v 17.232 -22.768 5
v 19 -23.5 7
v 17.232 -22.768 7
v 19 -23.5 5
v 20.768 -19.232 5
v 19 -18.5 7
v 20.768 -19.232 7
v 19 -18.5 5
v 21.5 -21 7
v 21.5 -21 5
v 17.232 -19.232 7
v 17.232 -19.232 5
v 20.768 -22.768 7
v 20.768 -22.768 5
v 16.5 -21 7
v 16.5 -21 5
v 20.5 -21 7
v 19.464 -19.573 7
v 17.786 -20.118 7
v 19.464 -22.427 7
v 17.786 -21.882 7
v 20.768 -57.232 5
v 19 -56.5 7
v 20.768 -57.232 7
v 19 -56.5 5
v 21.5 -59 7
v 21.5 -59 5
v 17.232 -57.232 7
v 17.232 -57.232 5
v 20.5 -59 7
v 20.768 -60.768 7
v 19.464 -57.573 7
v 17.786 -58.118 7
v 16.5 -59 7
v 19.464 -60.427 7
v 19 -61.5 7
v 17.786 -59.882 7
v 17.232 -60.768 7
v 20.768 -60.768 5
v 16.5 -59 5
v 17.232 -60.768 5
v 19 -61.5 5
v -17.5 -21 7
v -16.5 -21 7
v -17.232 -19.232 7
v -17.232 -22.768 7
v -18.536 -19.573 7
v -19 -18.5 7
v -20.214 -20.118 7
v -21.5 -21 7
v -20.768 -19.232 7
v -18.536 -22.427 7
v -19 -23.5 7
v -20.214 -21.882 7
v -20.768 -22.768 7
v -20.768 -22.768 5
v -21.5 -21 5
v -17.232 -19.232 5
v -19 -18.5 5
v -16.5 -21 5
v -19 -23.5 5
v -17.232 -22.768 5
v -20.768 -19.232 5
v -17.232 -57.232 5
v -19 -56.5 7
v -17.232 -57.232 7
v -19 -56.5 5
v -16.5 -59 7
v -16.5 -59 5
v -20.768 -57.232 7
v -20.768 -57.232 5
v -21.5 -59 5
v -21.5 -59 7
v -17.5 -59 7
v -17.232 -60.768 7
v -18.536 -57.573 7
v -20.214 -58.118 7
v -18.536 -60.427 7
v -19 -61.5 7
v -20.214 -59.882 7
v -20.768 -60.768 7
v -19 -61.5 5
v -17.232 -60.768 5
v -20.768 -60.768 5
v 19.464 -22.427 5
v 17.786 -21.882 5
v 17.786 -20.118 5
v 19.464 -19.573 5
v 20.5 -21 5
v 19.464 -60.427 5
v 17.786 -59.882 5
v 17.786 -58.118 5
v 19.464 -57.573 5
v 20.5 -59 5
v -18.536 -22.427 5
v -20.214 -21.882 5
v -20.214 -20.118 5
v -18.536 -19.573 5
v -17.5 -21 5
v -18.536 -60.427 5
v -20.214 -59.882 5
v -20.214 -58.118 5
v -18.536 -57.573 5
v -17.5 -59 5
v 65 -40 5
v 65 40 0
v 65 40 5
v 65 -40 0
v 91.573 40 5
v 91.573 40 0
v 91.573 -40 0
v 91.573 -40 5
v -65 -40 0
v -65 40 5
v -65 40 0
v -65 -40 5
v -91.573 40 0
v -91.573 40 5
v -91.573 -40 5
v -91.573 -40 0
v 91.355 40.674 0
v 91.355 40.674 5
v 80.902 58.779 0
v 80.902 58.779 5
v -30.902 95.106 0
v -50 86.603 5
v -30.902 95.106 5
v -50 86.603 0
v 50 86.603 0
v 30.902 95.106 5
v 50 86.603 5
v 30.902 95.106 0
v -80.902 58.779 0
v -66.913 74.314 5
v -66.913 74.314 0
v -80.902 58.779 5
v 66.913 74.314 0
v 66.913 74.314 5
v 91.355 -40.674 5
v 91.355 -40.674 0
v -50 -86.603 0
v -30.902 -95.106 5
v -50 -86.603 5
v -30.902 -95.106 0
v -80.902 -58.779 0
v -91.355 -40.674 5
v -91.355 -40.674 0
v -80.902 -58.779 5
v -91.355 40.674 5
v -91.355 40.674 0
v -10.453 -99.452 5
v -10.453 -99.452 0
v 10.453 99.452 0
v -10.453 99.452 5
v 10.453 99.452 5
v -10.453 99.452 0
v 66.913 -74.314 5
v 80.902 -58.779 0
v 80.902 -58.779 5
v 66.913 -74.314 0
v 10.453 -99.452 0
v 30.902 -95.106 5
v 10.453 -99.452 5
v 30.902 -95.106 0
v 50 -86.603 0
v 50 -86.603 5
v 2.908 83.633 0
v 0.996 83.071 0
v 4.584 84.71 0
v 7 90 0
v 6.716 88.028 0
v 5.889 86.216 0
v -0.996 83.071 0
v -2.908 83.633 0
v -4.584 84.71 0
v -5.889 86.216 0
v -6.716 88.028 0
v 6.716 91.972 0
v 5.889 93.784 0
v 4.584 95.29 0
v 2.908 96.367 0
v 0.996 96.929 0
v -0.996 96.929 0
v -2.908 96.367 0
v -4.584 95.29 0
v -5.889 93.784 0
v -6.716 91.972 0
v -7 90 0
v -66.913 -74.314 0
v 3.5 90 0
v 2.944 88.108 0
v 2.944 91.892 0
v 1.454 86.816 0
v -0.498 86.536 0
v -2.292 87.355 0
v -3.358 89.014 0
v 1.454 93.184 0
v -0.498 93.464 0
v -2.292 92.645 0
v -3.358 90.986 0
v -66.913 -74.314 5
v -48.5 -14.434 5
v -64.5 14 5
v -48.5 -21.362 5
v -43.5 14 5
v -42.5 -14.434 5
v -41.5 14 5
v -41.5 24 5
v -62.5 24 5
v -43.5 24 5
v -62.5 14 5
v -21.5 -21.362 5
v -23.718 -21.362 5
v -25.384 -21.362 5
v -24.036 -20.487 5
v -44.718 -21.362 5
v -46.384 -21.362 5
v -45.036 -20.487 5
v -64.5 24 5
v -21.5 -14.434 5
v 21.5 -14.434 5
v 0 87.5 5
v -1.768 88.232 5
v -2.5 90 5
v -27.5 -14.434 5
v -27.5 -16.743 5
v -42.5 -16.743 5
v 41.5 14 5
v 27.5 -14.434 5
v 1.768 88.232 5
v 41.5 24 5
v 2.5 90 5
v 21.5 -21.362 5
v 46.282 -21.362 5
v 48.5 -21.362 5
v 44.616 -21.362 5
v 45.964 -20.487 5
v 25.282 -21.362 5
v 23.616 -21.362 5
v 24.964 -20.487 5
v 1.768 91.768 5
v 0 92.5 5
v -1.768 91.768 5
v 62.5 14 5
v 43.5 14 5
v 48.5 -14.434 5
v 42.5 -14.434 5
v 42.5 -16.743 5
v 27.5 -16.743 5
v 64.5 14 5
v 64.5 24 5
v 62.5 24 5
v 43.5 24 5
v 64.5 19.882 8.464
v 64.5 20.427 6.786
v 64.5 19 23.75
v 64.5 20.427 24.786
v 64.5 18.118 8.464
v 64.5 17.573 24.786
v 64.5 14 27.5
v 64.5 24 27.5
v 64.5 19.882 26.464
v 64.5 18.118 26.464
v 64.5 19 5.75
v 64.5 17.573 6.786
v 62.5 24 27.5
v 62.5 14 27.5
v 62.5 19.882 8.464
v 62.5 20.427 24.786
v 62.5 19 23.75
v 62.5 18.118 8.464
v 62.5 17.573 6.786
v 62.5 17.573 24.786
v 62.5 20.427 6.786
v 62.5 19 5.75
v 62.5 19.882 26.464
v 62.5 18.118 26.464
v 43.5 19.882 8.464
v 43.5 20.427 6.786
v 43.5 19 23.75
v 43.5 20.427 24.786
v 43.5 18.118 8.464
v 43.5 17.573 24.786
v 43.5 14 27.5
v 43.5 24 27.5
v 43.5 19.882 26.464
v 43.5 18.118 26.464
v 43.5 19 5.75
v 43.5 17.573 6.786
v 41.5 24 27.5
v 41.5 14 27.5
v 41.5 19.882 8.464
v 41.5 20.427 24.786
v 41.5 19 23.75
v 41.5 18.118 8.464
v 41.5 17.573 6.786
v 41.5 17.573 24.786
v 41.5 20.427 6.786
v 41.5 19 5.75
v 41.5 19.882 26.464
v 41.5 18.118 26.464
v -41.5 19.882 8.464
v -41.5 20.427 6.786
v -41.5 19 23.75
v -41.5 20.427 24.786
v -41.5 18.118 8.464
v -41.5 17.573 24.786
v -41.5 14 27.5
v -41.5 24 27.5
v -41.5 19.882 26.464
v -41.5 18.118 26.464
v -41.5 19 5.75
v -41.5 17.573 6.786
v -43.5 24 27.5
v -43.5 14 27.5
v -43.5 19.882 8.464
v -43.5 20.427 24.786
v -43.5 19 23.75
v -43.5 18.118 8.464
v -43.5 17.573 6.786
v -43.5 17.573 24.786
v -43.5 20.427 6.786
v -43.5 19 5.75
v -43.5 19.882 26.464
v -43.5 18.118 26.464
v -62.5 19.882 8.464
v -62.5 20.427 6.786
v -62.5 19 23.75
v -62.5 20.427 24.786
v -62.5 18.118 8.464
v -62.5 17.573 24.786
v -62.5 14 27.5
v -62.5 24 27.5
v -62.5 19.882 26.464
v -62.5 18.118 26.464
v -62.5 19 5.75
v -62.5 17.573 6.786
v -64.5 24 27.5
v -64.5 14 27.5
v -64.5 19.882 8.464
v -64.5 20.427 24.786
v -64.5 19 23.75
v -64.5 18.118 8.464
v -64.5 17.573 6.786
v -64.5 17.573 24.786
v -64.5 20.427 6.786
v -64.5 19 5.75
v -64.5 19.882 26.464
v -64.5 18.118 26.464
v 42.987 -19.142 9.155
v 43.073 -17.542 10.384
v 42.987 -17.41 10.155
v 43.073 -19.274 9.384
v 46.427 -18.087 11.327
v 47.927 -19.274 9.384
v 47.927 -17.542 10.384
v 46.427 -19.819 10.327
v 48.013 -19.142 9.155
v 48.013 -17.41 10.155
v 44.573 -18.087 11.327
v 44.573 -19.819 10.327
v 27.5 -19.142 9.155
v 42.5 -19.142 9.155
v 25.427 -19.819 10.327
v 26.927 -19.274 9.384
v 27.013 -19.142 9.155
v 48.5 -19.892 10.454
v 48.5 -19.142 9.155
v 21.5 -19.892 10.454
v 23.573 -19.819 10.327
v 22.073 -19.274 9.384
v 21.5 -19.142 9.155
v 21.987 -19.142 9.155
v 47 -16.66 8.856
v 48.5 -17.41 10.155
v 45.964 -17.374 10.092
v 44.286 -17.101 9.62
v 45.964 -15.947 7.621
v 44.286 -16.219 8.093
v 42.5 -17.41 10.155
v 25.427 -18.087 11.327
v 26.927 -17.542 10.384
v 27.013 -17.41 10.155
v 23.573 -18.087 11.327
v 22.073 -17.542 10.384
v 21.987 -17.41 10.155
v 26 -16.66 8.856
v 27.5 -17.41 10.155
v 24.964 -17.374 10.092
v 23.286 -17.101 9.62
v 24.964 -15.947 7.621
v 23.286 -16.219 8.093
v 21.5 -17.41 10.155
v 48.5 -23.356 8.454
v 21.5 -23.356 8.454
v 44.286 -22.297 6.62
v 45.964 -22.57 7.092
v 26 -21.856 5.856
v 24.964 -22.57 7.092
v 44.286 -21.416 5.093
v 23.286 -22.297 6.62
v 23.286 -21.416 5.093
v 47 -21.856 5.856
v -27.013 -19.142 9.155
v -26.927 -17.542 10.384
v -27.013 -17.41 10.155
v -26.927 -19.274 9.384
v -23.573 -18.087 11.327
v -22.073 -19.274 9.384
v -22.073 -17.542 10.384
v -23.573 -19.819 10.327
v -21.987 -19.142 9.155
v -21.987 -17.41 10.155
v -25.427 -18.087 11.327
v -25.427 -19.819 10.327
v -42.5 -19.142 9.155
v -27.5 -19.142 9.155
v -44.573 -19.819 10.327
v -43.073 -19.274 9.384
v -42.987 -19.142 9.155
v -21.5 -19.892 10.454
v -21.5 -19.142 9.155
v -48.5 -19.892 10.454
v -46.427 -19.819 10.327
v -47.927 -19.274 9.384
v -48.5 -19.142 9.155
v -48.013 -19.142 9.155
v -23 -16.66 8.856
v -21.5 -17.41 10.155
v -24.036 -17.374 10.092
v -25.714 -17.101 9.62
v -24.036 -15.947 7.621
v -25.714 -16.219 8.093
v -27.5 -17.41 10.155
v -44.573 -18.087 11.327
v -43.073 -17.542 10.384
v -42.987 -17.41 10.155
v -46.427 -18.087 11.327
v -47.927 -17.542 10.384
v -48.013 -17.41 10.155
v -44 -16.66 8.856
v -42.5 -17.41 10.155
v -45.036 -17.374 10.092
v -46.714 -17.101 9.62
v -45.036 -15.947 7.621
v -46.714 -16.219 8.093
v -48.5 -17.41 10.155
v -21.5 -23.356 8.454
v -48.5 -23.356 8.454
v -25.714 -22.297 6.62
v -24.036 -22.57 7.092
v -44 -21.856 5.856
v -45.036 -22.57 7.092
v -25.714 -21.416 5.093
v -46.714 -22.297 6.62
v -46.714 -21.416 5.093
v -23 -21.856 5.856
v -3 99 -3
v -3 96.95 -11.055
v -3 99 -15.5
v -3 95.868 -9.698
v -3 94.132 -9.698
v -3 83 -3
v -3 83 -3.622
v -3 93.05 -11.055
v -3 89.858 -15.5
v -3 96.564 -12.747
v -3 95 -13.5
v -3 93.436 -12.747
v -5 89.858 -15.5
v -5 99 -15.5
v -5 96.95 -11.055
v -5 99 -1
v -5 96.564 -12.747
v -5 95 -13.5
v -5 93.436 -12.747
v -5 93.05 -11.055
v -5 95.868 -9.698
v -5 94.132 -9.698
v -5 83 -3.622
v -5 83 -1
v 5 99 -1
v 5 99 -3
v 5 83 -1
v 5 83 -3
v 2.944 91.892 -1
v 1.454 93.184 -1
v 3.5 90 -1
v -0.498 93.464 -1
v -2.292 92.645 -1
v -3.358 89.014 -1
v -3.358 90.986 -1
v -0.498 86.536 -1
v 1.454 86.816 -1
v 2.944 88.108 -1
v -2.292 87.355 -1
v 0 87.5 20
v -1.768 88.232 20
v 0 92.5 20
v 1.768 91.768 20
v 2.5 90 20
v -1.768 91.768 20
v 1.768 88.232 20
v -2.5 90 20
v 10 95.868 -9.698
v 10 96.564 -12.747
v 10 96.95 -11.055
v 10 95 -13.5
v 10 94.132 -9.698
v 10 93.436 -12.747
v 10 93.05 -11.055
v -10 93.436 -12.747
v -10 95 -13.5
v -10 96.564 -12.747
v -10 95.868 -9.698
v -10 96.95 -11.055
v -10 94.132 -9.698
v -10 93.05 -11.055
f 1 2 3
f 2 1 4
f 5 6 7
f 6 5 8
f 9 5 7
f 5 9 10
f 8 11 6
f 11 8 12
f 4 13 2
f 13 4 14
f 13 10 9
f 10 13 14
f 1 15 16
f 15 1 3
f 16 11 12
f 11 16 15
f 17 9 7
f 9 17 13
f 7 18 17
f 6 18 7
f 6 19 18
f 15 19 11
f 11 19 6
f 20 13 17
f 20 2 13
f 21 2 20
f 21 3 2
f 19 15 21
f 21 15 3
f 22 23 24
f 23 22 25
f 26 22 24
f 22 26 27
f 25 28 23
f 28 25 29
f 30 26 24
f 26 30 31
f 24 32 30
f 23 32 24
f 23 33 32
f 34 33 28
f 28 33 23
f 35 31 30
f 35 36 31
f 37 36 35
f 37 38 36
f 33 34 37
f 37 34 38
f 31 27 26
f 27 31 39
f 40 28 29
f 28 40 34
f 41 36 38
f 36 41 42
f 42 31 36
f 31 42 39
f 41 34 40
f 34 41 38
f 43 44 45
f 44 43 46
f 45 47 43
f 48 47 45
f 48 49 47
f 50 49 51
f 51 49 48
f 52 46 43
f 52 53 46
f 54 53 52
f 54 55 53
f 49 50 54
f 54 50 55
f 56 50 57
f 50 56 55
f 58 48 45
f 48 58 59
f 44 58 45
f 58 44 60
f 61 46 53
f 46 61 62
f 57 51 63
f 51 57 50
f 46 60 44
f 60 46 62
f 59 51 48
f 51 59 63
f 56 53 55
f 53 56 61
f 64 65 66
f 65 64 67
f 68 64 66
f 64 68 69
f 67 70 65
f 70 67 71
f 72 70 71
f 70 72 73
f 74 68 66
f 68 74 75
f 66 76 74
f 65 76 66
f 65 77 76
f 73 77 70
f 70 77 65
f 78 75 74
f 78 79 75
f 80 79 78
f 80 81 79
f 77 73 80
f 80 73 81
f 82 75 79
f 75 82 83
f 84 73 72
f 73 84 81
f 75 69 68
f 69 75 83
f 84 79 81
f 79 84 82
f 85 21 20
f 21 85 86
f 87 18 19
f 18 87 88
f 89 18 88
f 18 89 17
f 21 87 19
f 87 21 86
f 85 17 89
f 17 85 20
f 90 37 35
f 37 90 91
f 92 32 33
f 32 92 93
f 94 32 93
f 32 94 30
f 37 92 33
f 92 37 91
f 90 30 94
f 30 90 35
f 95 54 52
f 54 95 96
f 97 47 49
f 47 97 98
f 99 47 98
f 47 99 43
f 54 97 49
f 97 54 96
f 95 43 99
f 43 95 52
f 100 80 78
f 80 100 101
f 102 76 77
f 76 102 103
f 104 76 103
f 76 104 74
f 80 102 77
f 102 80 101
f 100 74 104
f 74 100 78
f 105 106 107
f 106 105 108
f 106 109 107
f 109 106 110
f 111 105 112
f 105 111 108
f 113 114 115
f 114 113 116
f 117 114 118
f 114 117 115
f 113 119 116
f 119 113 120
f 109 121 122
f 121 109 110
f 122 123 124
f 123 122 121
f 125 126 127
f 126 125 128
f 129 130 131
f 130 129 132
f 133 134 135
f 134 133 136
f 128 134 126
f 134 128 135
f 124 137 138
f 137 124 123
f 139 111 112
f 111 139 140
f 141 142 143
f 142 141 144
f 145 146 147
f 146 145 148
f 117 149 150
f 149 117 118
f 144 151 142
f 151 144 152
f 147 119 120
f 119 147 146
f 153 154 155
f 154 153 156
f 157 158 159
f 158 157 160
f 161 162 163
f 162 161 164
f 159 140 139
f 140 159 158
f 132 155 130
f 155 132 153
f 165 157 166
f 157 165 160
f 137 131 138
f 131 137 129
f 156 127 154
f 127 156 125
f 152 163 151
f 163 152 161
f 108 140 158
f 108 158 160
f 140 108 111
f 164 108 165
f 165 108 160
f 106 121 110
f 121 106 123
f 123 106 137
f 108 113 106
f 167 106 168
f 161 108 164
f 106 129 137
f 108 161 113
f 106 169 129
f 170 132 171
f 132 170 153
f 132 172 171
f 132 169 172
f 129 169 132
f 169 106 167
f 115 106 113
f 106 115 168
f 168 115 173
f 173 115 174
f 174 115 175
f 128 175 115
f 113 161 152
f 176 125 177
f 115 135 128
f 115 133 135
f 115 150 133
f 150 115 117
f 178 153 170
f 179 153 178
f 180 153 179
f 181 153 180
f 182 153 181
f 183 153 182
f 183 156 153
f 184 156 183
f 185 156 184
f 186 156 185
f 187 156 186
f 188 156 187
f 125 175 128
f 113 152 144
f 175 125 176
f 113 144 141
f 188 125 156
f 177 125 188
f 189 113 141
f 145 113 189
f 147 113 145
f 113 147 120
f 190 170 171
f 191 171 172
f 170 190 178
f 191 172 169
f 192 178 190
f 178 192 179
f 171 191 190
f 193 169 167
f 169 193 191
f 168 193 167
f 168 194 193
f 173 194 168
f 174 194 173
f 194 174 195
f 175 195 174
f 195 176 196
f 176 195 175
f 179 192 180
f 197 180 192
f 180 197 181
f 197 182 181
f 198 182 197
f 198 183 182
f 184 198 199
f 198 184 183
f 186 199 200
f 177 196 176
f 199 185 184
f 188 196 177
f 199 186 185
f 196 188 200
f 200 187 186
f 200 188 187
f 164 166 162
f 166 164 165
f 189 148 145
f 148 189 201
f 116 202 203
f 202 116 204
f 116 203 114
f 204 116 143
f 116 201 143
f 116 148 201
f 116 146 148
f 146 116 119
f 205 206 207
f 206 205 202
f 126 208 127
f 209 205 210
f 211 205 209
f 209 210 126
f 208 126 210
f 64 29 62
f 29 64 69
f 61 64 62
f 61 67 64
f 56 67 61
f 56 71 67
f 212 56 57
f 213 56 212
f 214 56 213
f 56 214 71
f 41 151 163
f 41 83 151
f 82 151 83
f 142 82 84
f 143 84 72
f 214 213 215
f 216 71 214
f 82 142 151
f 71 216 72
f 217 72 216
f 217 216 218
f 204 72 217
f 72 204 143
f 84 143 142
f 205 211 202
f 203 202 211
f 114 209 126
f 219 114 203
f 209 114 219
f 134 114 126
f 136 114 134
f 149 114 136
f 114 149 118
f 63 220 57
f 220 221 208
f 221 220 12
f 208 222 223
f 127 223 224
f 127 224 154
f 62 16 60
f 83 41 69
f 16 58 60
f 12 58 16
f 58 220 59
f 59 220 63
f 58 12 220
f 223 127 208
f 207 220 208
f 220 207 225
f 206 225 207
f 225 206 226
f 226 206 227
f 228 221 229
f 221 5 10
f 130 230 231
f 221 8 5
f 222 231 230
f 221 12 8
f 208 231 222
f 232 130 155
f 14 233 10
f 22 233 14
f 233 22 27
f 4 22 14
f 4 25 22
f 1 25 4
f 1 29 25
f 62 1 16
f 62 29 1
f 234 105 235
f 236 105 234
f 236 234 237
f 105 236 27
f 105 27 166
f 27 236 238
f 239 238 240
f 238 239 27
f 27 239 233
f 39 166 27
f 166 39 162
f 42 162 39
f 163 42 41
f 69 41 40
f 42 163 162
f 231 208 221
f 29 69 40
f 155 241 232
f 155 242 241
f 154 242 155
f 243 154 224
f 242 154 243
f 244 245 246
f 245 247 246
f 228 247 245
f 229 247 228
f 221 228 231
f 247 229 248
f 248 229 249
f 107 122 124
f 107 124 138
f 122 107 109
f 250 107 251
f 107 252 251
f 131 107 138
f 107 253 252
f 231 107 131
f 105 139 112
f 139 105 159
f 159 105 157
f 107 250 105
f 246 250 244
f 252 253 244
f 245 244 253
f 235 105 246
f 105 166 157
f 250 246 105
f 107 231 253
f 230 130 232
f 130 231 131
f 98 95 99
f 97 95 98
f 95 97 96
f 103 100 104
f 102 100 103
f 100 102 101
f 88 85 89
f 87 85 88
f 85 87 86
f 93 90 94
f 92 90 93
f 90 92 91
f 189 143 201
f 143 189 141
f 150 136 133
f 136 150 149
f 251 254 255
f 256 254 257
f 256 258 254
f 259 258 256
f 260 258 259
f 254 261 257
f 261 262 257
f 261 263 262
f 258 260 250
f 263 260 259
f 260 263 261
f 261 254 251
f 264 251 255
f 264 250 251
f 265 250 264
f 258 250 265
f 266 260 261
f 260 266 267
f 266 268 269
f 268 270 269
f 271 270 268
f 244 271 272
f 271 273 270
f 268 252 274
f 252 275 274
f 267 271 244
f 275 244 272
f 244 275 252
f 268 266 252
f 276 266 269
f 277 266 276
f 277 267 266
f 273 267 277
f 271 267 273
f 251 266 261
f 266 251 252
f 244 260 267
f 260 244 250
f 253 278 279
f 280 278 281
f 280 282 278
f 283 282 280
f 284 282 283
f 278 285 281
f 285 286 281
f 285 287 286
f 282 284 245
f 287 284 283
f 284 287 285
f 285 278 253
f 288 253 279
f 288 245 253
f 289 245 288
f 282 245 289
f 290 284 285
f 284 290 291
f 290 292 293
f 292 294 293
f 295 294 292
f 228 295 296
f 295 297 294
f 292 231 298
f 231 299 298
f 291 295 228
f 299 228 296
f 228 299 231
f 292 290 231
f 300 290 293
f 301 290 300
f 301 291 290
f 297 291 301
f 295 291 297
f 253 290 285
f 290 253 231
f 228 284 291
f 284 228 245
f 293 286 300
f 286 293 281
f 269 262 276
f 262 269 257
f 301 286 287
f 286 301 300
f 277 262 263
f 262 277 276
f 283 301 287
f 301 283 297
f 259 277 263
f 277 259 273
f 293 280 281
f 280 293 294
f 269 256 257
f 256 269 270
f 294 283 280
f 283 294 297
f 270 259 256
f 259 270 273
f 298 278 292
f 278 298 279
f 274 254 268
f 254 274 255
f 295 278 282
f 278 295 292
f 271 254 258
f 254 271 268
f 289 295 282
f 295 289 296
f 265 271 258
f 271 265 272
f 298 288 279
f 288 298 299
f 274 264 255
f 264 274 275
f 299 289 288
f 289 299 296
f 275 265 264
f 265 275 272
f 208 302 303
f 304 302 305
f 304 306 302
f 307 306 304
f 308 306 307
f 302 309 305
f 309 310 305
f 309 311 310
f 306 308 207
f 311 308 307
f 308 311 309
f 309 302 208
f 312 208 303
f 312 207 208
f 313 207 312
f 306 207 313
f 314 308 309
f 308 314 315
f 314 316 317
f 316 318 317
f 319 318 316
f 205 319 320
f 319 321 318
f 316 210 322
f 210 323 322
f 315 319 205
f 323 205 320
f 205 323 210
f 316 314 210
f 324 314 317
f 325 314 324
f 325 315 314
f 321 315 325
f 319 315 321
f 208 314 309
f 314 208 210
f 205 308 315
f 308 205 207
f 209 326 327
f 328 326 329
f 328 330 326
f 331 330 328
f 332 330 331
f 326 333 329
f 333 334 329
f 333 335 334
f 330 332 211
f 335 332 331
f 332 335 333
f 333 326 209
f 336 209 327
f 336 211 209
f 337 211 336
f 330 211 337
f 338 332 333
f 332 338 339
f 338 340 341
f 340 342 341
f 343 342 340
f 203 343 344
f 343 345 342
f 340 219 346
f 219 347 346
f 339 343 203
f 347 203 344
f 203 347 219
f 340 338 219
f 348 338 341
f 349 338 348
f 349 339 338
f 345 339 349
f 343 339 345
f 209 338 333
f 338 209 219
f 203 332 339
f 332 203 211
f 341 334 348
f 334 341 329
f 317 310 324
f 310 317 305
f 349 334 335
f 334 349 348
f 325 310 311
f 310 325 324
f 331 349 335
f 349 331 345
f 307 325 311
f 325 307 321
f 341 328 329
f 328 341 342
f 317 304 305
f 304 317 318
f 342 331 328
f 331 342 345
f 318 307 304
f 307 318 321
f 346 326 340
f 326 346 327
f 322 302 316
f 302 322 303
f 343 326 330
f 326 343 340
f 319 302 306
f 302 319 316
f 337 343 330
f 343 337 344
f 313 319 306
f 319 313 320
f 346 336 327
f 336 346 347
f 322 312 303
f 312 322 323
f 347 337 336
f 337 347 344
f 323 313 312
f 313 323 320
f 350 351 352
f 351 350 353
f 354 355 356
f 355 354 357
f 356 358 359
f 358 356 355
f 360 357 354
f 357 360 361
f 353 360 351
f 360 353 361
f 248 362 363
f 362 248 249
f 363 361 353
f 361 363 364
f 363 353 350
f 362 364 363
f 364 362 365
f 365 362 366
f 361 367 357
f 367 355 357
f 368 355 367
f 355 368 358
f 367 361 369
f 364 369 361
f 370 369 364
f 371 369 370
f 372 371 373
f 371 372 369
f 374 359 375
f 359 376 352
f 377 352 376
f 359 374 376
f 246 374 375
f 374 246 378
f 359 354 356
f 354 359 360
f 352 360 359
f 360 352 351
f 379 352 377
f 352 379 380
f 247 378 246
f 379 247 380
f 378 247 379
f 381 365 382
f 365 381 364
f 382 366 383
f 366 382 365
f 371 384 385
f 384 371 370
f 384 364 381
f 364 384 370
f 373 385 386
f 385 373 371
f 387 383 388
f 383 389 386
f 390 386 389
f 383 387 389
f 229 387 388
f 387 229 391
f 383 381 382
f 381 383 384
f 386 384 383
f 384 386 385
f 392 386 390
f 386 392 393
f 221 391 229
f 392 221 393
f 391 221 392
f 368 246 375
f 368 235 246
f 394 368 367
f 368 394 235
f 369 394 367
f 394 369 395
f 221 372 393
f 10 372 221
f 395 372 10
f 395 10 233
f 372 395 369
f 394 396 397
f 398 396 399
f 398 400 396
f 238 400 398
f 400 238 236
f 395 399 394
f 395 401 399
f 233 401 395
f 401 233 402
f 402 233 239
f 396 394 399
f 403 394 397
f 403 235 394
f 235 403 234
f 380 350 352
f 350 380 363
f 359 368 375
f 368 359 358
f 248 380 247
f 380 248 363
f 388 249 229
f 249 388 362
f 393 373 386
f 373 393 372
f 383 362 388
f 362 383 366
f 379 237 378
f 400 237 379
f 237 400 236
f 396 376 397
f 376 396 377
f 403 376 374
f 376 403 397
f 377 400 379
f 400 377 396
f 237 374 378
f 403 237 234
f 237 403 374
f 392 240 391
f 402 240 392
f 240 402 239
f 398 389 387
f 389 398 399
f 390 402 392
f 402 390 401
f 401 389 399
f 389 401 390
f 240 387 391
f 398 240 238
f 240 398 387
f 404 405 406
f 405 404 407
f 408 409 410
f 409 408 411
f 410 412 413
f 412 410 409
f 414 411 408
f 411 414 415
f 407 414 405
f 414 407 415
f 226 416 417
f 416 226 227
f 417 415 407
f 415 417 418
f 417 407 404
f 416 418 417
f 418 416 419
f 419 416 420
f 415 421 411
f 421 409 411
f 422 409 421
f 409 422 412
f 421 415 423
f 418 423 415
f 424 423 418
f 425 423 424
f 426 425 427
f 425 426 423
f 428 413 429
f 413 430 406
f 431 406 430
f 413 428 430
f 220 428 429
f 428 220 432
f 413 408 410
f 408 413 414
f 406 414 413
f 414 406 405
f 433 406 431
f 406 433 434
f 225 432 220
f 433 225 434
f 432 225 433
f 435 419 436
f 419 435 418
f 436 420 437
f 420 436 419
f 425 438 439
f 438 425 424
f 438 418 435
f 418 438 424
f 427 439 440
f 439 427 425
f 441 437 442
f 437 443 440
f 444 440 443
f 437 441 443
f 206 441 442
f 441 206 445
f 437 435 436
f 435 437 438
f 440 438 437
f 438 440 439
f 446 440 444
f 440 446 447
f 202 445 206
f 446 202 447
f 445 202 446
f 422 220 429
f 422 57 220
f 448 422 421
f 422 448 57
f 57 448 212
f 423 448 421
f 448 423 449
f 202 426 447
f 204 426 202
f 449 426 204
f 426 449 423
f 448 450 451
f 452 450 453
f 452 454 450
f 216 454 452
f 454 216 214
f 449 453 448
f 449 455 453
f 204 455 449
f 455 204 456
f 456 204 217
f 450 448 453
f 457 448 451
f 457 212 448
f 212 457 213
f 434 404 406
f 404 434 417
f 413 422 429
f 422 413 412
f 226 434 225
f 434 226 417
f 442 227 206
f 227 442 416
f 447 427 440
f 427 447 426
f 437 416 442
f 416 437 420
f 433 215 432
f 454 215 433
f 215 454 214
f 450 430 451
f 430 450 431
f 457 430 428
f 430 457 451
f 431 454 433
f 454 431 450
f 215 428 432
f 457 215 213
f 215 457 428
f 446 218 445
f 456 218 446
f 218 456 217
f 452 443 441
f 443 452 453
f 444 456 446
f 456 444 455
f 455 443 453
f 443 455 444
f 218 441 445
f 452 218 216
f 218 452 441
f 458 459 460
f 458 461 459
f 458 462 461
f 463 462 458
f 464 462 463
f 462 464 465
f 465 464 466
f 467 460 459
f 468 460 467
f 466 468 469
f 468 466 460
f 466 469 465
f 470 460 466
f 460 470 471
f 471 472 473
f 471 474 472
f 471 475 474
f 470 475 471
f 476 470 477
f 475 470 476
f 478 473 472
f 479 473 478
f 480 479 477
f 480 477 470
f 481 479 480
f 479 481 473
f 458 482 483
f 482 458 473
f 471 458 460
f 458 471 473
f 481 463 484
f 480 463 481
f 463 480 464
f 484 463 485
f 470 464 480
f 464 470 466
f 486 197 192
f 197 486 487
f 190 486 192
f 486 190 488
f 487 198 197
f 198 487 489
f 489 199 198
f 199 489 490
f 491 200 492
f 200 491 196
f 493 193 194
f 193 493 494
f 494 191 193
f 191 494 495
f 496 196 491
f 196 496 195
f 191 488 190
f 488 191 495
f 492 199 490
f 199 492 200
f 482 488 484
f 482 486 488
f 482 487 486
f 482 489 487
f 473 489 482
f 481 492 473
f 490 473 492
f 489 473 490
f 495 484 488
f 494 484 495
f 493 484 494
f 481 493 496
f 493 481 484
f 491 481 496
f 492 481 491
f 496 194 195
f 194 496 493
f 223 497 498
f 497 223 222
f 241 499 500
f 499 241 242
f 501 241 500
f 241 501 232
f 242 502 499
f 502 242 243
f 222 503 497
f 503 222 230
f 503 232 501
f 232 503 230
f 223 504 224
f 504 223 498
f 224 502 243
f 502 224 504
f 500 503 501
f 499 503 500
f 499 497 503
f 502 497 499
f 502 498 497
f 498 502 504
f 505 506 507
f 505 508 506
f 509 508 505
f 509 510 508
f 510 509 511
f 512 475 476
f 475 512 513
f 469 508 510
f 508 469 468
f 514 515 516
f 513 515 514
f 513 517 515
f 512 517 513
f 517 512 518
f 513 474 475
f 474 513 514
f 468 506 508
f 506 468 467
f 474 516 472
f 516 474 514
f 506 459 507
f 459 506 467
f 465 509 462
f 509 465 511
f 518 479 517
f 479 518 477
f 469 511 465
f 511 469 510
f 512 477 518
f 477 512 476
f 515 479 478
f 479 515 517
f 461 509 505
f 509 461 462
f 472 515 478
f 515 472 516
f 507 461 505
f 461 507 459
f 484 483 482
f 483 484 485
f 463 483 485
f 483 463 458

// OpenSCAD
mainDiameter = 200;
mainThickness = 5;

// wheel Slots
wheelSlotLength = 80;
wheelSlotDepth = 35;

module wheelSlot(ypos) 
{
    translate([0, ypos,0])
  {  
     
    shift = mainDiameter/2 -wheelSlotDepth/2;
    translate([shift,0,3]) cube([wheelSlotDepth,wheelSlotLength, 10], center= true);

    translate([-shift,0,3]) cube([wheelSlotDepth,wheelSlotLength, 10], center= true);
  }
}

module motor(xShift, ypos)
{
  motorZ = 22.5;  
  motorX = 19;
  motorY = 65;  
  shaftToSide = 12;
  holesToSide = 31;
    
  shaftLength = 37;
    
  zShift =   mainThickness + motorZ/2 ;
    
  translate([xShift, ypos,0])
  {  
       // body  
      %color( "yellow", 0.3 )translate([0, motorY/2 - shaftToSide, zShift])color( "Yellow", 1.0 ) cube([motorX,motorY, motorZ], center= true);  
      
      // shaft 
      %color( "White", 0.3 ) translate([0, 0, zShift])rotate([0,90,0])cylinder(h = shaftLength, d = 5, center = true);
        
      %color( "Black", 0.3 ) translate([shaftLength/2 - 3/2, 0, zShift])rotate([0,90,0])cylinder(h = 3, d = 25, center = true);
      %color( "Black", 0.3 ) translate([- shaftLength/2 + 3/2, 0, zShift])rotate([0,90,0])cylinder(h = 3, d = 25, center = true);
    
  // holes
  
      difference()
      {
          // support  
          supportThickness = 2;
          color( "green", 1.0 )
          {
            translate([motorX/2 + supportThickness/2, holesToSide-shaftToSide , zShift])color( "Yellow", 1.0 ) cube([supportThickness,10, motorZ], center= true);  
            
            translate([- motorX/2 - supportThickness/2, holesToSide-shaftToSide , zShift])color( "Yellow", 1.0 ) cube([supportThickness,10, motorZ], center= true);
          }   
          
          centerShift = 9;  
          translate([0, holesToSide-shaftToSide , zShift + centerShift ])rotate([0,90,0])cylinder(h = 30, d = 3, center = true);
          translate([0, holesToSide-shaftToSide, zShift - centerShift ])rotate([0,90,0])cylinder(h = 30, d = 3, center = true);
      
      }
    }
}

module HBridge(Xpos, Ypos)
{
    translate([Xpos, Ypos, 0])
    {
        height = 30;
        hole2hole = 38;
        zShift = mainThickness + height/2;
        %color( "yellow", 0.3 )translate([0,0, zShift])color( "Yellow", 1.0 ) cube([43,43, height], center= true);  
        
        spacer = 2 * 2;
    
        difference()
        {
           union() 
            {
                translate([hole2hole/2, hole2hole/2, mainThickness])cylinder(h = spacer, d = 5, center = true);
                translate([hole2hole/2, -hole2hole/2, mainThickness])cylinder(h = spacer, d = 5, center = true);
                translate([-hole2hole/2, hole2hole/2, mainThickness])cylinder(h = spacer, d = 5, center = true);
                translate([-hole2hole/2, -hole2hole/2, mainThickness])cylinder(h = spacer, d = 5, 
                center = true);
            }
            
            translate([hole2hole/2, hole2hole/2, 0])cylinder(h = 100, d = 3, center = true);
            translate([hole2hole/2, -hole2hole/2, 0])cylinder(h = 100, d = 3, center = true);
            translate([-hole2hole/2, hole2hole/2, 0])cylinder(h = 100, d = 3, center = true);
            translate([-hole2hole/2, -hole2hole/2, 0])cylinder(h = 100, d = 3, center = true);
            
        }
    }
}

module Wheel(Xpos, Ypos, Zpos)
{
    %translate([Xpos, Ypos, Zpos]) color( "Black", 0.3 ) translate([0, 0, 0])rotate([0,90,0])cylinder(h = 25, d = 68, center = true);
}

module EncoderSupport(Xpos, Ypos, Zpos)
{
    holeDistance = 21;
   
    translate([Xpos, Ypos, Zpos + mainThickness ])
    {
        %union()
        {
            cube([26,4, 6], center= true);
            difference()
            {
                translate([0, 13/2 - 2, 0])cube([17,13, 6], center= true);
                translate([0, 13/2 - 2, 0])cube([6,14, 7], center= true);
            }
        }
        
        difference()
        {
            union()
            {
                translate([holeDistance/2, -3, 0])rotate([90,0,0])cylinder(h = 2, d = 6, center = true);
                translate([-holeDistance/2, -3, 0])rotate([90,0,0])cylinder(h = 2, d = 6, center = true);
                 translate([0, -2-2-2, -(Zpos)/2])cube([27,4,6+Zpos], center=true);
                 translate([27/2 - 3, -3, -(Zpos)/2])cube([6,2,6+Zpos-3], center=true);
                 translate([-27/2 + 3, -3, -(Zpos)/2])cube([6,2,6+Zpos-3], center=true);

            }
            translate([holeDistance/2, 0, 0])rotate([90,0,0])cylinder(h = 30, d = 3, center = true);
        translate([-holeDistance/2, 0, 0])rotate([90,0,0])cylinder(h = 30, d = 3, center = true);
        }
        
        
    }
}


HBridge(0, -40);

difference()
{

#color( "green", 0.3 )cylinder(h = mainThickness, d = mainDiameter);
color( "Purple", 0.2 )wheelSlot(0);
translate([0, 0, -mainThickness])color( "green", 0.3 )cylinder(h = mainThickness, d = mainDiameter);

}

motor(53, 0);
motor(-53, 0);

Wheel(80, 0, 5 + 22/2);
Wheel(-80, 0, 5 + 22/2);

difference()
{
    union()
    {
        rotate([30,0,0])EncoderSupport(35, -8, 22/2);
        rotate([30,0,0])EncoderSupport(-35, -8, 22/2);
    }
    translate([0, 0, -100])color( "green", 0.3 )cylinder(h = 100, d = mainDiameter);
}


bottom = 15;
//translate([0, 0, -bottom])cylinder(h = bottom, d = 10);
wheelDiam = 15;
wheelHole=4;

shift = 3;
Yshift = 90;




//sub : bearing
translate([0, Yshift, 0])rotate([0,0,0])cylinder(h = 5, d = 14);

//spacer
spacerDiam=7;
translate([0, Yshift, -1])rotate([0,0,0])cylinder(h = 1, d = spacerDiam);

// baseplate
//translate([0, Yshift, -3])rotate([0,0,0])cylinder(h = 2, d = wheelDiam + 2);

//vertical shaft
translate([0, Yshift, 0])rotate([0,0,0])cylinder(h = 20, d = 5);

//wheel
%color( "Green", 0.7 )translate([-3, Yshift+5, -wheelDiam/2 -2 -2 ])rotate([0,90,0])cylinder(h = 6, d = wheelDiam);
//wheel axis
translate([-10, Yshift+5, -wheelDiam/2 -2 - 2])rotate([0,90,0])cylinder(h = 20, d = wheelHole);

color( "Blue", 0.7 )translate([-2-3, Yshift-7, -3])cube([10,16,2]);

difference()
{
    
color( "Blue", 0.7 )translate([-2-3, Yshift-7, -wheelDiam/2 -2 - 2 -4])cube([2,16,13]);
color( "Blue", 0.7 )translate([-2-5, 48, -3])rotate([-60,0,0])cube([20,50,30]);
}
